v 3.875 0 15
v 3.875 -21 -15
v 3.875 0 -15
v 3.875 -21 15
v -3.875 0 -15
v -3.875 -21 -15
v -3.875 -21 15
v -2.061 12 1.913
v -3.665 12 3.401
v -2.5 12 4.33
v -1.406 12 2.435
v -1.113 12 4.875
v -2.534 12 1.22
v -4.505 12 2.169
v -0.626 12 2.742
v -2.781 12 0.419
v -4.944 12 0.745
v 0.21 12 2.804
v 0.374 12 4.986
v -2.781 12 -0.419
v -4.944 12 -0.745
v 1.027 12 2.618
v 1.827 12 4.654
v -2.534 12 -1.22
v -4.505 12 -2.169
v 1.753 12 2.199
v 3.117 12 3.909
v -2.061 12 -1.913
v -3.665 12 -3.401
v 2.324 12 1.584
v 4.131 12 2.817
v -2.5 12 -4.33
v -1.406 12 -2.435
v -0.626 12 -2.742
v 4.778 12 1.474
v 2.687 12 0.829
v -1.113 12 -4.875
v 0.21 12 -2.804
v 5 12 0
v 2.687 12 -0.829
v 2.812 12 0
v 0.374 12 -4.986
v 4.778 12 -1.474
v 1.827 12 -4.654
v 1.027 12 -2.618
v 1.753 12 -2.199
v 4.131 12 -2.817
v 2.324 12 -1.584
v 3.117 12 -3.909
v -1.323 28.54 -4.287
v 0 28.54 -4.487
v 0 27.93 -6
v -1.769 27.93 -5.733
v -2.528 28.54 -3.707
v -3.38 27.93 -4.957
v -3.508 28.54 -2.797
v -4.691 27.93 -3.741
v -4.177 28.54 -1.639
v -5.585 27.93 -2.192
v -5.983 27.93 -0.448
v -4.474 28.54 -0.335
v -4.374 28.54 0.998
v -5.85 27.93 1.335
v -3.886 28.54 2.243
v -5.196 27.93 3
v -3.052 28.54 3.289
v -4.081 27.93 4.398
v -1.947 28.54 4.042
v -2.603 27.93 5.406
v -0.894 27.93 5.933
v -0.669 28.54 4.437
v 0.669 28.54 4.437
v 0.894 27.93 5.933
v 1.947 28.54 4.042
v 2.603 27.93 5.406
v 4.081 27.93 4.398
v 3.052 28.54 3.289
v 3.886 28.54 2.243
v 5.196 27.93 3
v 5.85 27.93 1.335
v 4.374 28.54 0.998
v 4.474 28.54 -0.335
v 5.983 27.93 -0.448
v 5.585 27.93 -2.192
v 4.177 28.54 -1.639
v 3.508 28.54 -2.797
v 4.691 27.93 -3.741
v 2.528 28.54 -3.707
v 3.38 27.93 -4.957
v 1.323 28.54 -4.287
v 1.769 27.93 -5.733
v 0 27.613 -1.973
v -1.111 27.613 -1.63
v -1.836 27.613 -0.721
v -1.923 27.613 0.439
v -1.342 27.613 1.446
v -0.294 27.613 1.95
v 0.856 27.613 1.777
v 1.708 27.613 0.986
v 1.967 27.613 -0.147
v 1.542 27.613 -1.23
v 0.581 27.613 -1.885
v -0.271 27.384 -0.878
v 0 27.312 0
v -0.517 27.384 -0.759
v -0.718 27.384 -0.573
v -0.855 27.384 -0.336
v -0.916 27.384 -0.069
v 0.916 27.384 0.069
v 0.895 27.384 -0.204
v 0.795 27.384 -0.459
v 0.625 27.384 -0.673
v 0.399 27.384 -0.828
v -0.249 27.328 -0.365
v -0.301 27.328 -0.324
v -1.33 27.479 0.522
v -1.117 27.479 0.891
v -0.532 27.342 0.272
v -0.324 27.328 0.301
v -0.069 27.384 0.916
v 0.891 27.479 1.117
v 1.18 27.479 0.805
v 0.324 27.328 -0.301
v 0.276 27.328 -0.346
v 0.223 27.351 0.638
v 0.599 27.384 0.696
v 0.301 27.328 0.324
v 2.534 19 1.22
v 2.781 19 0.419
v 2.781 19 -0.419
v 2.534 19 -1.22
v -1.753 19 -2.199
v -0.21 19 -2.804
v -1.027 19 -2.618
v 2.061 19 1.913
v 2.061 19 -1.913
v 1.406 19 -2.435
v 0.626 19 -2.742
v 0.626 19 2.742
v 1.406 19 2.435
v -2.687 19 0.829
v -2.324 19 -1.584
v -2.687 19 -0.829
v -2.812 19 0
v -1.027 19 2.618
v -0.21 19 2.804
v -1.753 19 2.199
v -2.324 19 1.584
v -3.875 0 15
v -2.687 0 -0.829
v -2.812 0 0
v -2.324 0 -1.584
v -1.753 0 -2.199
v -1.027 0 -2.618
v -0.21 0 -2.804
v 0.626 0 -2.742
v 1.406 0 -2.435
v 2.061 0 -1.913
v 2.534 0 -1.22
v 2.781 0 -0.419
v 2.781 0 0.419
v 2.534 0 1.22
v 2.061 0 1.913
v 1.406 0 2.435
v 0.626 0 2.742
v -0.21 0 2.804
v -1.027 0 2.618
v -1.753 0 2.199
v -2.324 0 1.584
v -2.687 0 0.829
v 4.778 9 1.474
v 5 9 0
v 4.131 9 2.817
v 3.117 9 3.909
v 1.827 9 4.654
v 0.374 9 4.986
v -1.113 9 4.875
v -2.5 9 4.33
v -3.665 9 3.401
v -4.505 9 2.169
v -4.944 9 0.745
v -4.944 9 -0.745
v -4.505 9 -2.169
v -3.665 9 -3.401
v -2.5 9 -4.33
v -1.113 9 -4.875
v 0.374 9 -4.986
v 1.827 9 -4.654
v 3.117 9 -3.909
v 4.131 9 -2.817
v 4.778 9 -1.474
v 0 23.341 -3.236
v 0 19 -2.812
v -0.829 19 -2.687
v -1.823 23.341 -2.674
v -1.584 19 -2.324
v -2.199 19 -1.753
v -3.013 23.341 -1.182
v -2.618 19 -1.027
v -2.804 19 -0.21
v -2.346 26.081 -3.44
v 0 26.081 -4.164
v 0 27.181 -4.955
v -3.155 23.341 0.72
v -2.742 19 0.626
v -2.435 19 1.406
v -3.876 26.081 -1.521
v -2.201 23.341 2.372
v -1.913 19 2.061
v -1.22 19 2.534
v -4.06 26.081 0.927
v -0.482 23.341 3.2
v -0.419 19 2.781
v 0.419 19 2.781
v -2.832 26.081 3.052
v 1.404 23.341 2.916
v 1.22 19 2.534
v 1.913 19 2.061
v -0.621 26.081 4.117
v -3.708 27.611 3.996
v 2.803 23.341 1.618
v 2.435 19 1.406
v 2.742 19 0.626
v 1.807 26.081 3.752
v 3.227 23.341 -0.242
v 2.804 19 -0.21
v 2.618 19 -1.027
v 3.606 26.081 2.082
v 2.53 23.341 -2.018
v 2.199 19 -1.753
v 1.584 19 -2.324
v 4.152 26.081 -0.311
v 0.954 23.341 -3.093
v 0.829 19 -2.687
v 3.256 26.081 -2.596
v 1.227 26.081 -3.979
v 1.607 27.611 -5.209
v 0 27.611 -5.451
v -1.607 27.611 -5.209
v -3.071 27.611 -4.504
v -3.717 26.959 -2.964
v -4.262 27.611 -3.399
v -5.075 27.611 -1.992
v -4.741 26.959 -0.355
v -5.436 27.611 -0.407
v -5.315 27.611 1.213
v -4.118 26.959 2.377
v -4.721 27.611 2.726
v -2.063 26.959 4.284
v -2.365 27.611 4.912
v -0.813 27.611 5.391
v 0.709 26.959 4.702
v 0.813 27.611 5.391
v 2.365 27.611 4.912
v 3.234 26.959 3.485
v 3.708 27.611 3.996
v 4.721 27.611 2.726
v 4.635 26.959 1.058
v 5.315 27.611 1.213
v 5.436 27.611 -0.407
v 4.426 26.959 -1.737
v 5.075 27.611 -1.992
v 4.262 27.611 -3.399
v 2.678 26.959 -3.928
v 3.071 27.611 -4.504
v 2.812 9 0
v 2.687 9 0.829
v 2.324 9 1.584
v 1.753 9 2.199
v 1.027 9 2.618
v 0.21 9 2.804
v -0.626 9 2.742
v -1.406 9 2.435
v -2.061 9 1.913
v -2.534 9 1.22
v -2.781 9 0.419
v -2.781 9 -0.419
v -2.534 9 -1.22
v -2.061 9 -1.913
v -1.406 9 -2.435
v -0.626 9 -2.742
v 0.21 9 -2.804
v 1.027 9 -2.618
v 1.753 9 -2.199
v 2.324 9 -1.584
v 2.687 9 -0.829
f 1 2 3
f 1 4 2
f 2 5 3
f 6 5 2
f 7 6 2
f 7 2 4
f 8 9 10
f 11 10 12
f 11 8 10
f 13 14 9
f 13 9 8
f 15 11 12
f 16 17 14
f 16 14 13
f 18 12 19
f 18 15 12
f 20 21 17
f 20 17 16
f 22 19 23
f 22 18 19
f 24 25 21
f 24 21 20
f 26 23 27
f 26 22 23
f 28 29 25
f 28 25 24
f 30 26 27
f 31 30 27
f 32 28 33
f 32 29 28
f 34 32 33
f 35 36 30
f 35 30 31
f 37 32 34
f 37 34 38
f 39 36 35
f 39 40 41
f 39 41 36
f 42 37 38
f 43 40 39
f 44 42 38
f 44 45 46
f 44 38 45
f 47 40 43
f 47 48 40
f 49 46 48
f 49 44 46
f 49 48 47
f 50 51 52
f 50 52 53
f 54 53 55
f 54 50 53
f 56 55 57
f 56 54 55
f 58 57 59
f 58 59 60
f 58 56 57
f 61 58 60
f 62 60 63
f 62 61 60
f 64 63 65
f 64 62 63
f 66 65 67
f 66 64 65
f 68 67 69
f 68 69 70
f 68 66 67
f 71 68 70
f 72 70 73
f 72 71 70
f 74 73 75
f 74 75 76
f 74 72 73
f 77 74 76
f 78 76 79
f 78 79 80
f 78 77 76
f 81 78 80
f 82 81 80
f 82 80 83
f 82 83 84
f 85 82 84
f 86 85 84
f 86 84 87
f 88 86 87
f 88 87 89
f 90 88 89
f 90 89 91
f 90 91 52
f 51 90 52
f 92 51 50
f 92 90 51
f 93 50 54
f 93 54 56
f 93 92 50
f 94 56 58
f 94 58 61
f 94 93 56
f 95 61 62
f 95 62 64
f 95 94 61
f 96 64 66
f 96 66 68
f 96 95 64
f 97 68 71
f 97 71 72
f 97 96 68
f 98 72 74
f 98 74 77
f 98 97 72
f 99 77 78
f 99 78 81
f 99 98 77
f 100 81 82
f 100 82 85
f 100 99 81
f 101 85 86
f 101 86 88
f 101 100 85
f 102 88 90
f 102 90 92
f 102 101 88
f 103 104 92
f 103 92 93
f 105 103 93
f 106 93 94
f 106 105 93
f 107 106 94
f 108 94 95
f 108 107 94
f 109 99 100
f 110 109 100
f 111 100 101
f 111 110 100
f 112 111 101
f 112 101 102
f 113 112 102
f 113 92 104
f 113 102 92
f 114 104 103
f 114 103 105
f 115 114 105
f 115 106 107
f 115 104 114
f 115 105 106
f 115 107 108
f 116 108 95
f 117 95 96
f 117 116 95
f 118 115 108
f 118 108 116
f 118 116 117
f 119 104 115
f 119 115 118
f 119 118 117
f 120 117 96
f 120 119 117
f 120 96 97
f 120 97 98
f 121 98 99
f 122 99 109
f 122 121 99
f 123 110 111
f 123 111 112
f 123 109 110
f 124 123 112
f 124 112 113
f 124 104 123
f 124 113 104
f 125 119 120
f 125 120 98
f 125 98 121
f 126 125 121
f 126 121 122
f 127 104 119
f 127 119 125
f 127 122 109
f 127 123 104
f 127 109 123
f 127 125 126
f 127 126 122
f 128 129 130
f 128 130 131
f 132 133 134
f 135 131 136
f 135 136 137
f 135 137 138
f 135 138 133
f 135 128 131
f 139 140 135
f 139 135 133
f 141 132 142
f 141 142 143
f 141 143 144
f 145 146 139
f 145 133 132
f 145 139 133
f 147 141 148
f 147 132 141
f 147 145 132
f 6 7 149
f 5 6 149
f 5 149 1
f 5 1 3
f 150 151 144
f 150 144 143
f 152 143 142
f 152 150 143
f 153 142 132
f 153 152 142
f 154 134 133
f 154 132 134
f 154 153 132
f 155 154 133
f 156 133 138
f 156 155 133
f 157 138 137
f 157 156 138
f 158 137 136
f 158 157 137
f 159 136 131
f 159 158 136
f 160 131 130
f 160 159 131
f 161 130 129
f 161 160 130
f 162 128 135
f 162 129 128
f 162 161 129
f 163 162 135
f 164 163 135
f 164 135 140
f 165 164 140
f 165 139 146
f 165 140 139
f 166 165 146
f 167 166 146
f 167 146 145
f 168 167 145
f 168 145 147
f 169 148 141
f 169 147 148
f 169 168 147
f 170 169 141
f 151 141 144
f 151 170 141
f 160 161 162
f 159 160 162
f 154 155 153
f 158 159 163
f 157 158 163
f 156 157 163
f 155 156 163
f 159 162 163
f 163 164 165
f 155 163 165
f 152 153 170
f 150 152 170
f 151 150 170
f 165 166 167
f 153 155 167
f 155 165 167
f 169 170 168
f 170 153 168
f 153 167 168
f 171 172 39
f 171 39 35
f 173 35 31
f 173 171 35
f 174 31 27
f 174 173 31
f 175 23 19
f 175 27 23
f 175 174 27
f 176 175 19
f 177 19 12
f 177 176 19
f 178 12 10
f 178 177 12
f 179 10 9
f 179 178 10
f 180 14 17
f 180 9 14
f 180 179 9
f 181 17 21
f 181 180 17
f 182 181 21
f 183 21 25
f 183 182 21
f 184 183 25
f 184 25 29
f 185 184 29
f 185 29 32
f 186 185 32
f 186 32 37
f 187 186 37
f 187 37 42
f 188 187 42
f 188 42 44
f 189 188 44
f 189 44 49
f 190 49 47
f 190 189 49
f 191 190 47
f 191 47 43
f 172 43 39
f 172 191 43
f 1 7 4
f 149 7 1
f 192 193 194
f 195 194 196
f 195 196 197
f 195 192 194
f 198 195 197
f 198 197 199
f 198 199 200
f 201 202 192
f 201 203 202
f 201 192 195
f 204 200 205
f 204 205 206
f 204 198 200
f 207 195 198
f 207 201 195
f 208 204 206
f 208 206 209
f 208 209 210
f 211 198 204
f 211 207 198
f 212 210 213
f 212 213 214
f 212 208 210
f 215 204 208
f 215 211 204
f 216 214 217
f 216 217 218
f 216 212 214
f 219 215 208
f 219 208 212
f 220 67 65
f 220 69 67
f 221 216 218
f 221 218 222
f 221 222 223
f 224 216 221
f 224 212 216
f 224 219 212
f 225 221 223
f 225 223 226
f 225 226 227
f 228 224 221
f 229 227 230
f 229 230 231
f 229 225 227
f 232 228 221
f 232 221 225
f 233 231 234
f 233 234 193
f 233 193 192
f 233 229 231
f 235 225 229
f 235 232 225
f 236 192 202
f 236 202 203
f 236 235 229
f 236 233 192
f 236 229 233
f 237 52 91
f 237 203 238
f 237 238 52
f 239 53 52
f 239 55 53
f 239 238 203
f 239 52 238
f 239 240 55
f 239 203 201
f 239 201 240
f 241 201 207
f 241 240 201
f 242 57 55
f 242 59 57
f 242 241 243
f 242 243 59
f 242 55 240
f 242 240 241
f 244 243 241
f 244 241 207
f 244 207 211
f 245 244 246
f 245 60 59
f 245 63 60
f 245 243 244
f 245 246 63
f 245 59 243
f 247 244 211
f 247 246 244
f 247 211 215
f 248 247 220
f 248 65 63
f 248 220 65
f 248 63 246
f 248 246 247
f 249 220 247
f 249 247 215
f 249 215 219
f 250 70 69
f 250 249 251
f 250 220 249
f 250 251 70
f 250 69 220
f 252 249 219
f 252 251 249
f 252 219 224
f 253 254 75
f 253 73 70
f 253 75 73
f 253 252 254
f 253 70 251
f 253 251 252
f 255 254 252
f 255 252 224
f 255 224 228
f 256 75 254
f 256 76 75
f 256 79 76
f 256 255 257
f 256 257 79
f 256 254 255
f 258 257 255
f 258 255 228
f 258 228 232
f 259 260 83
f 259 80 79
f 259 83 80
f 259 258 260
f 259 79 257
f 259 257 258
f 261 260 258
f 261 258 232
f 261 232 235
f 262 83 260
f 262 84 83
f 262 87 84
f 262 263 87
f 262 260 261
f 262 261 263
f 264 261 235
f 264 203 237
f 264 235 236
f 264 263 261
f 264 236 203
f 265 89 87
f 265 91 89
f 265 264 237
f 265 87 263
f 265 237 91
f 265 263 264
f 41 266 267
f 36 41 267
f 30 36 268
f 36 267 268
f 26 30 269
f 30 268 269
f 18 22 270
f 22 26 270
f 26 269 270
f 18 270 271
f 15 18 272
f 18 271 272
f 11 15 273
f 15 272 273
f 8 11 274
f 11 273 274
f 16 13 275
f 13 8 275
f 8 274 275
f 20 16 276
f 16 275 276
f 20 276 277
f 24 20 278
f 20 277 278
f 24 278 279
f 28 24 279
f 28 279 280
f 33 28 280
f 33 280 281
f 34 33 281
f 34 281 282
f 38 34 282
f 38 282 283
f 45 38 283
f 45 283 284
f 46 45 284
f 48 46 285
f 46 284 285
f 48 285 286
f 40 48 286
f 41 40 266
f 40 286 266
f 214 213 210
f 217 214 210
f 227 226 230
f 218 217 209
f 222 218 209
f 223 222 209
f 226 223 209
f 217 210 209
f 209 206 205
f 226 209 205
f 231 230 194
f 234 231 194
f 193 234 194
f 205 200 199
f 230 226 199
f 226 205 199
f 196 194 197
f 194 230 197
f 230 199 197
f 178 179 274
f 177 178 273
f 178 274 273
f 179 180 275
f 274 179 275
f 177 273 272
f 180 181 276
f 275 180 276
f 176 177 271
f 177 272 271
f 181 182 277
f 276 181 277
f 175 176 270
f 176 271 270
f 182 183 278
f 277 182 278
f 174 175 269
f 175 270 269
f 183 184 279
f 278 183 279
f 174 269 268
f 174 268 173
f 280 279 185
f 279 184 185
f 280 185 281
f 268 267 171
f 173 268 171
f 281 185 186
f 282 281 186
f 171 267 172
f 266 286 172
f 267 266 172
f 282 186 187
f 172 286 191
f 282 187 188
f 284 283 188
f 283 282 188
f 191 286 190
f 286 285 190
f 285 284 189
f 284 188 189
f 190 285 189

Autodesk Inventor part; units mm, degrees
ref_plane "YZ Plane" through (0, 0, 0) normal (1, 0, 0) x (0, 1, 0)
ref_plane "XZ Plane" through (0, 0, 0) normal (0, 1, 0) x (-1, 0, 0)
sketch "Sketch1" plane through (0, 0, 0) normal (0, 1, 0) x (-1, 0, 0)
  circle A0 centre (0, 0) radius 2.8122
extrude "Extrusion1" add sketch "Sketch1" along normal blind 19
sketch "Sketch2" plane through (0, 0, 0) normal (1, 0, 0) x (0, 1, 0)
  spline S0 degree 2 poles (19, -2.8122) (26.5342, -2.9696) (27.9304, -6) knots 0 0 0 1 1 1
  spline S1 degree 2 poles (27.9304, -6) (28.1632, -5.1392) (28.5405, -4.4868) knots 0 0 0 1 1 1
  spline S2 degree 2 poles (28.5405, -4.4868) (27.299, -1.7016) (27.3119, 0) knots 0 0 0 1 1 1
  line L0 (-5.7153, 0) -> (34.2916, 0) projected
  line L1 (19, 2.8122) -> (19, -2.8122) construction
  line L2 (19, -2.8122) -> (19, 2.8122) projected
  line L3 (19, -2.8122) -> (19, 0)
  line L4 (19, 0) -> (27.3119, 0)
  point P0 (0, 0)
  point P1 (25.9548, -4.0972)
  point P2 (28.2123, -5.1594)
  point P3 (27.5285, -1.6463)
  dimension "d2" = 6
revolve "Revolution1" add sketch "Sketch2" angle 360 about axis through (0, -10, 0) along (0, 1, 0) separate body
sketch "Sketch3" plane through (0, 0, 0) normal (1, 0, 0) x (0, 1, 0)
  line L0 (-21, 15) -> (0, 15)
  line L1 (0, 15) -> (0, -15)
  line L2 (0, -15) -> (-21, -15)
  line L3 (-21, -15) -> (-21, 15)
  line L4 (-21, 15) -> (0, -15) construction
  line L5 (0, 15) -> (-21, -15) construction
  line L6 (-25.2, 0) -> (4.2, 0) projected
  point P0 (0, 0)
  point P1 (-10.5, 0)
  point P2 (-10.5, 0)
  dimension "d4" = 30
  dimension "d5" = 21
extrude "Extrusion2" add sketch "Sketch3" along normal mid plane 7.75 separate body
ref_plane "Work Plane1" through (-3.875, 9, 15) normal (0, 1, 0) x (1, 0, 0)
sketch "Sketch4" plane through (-3.875, 9, 15) normal (0, 1, 0) x (1, 0, 0)
  circle A0 centre (3.875, 15) radius 5
  circle A1 centre (3.875, 15) radius 2.8122 projected
  dimension "d9" = 10
extrude "Extrusion3" add sketch "Sketch4" along normal blind 3 separate body
equation "\"d0\" = l_fastener_button"
equation "\"wl_panel\" = 285"
equation "\"t_panel\" = 8"
equation "\"r_button\" = 8"
equation "\"l_stereo\" = 178"
equation "\"d_stereo\" = 177"
equation "\"w_label\" = 15"
equation "\"r_labelscrew\" = 2.5"
equation "\"ro_labelscrew\" = 5"
equation "\"l_buttontobutton\" = 25"
equation "\"r_usboutlet\" = 29"
equation "\"l_fastener_button\" = 19"
properties part number "dragswitch"
